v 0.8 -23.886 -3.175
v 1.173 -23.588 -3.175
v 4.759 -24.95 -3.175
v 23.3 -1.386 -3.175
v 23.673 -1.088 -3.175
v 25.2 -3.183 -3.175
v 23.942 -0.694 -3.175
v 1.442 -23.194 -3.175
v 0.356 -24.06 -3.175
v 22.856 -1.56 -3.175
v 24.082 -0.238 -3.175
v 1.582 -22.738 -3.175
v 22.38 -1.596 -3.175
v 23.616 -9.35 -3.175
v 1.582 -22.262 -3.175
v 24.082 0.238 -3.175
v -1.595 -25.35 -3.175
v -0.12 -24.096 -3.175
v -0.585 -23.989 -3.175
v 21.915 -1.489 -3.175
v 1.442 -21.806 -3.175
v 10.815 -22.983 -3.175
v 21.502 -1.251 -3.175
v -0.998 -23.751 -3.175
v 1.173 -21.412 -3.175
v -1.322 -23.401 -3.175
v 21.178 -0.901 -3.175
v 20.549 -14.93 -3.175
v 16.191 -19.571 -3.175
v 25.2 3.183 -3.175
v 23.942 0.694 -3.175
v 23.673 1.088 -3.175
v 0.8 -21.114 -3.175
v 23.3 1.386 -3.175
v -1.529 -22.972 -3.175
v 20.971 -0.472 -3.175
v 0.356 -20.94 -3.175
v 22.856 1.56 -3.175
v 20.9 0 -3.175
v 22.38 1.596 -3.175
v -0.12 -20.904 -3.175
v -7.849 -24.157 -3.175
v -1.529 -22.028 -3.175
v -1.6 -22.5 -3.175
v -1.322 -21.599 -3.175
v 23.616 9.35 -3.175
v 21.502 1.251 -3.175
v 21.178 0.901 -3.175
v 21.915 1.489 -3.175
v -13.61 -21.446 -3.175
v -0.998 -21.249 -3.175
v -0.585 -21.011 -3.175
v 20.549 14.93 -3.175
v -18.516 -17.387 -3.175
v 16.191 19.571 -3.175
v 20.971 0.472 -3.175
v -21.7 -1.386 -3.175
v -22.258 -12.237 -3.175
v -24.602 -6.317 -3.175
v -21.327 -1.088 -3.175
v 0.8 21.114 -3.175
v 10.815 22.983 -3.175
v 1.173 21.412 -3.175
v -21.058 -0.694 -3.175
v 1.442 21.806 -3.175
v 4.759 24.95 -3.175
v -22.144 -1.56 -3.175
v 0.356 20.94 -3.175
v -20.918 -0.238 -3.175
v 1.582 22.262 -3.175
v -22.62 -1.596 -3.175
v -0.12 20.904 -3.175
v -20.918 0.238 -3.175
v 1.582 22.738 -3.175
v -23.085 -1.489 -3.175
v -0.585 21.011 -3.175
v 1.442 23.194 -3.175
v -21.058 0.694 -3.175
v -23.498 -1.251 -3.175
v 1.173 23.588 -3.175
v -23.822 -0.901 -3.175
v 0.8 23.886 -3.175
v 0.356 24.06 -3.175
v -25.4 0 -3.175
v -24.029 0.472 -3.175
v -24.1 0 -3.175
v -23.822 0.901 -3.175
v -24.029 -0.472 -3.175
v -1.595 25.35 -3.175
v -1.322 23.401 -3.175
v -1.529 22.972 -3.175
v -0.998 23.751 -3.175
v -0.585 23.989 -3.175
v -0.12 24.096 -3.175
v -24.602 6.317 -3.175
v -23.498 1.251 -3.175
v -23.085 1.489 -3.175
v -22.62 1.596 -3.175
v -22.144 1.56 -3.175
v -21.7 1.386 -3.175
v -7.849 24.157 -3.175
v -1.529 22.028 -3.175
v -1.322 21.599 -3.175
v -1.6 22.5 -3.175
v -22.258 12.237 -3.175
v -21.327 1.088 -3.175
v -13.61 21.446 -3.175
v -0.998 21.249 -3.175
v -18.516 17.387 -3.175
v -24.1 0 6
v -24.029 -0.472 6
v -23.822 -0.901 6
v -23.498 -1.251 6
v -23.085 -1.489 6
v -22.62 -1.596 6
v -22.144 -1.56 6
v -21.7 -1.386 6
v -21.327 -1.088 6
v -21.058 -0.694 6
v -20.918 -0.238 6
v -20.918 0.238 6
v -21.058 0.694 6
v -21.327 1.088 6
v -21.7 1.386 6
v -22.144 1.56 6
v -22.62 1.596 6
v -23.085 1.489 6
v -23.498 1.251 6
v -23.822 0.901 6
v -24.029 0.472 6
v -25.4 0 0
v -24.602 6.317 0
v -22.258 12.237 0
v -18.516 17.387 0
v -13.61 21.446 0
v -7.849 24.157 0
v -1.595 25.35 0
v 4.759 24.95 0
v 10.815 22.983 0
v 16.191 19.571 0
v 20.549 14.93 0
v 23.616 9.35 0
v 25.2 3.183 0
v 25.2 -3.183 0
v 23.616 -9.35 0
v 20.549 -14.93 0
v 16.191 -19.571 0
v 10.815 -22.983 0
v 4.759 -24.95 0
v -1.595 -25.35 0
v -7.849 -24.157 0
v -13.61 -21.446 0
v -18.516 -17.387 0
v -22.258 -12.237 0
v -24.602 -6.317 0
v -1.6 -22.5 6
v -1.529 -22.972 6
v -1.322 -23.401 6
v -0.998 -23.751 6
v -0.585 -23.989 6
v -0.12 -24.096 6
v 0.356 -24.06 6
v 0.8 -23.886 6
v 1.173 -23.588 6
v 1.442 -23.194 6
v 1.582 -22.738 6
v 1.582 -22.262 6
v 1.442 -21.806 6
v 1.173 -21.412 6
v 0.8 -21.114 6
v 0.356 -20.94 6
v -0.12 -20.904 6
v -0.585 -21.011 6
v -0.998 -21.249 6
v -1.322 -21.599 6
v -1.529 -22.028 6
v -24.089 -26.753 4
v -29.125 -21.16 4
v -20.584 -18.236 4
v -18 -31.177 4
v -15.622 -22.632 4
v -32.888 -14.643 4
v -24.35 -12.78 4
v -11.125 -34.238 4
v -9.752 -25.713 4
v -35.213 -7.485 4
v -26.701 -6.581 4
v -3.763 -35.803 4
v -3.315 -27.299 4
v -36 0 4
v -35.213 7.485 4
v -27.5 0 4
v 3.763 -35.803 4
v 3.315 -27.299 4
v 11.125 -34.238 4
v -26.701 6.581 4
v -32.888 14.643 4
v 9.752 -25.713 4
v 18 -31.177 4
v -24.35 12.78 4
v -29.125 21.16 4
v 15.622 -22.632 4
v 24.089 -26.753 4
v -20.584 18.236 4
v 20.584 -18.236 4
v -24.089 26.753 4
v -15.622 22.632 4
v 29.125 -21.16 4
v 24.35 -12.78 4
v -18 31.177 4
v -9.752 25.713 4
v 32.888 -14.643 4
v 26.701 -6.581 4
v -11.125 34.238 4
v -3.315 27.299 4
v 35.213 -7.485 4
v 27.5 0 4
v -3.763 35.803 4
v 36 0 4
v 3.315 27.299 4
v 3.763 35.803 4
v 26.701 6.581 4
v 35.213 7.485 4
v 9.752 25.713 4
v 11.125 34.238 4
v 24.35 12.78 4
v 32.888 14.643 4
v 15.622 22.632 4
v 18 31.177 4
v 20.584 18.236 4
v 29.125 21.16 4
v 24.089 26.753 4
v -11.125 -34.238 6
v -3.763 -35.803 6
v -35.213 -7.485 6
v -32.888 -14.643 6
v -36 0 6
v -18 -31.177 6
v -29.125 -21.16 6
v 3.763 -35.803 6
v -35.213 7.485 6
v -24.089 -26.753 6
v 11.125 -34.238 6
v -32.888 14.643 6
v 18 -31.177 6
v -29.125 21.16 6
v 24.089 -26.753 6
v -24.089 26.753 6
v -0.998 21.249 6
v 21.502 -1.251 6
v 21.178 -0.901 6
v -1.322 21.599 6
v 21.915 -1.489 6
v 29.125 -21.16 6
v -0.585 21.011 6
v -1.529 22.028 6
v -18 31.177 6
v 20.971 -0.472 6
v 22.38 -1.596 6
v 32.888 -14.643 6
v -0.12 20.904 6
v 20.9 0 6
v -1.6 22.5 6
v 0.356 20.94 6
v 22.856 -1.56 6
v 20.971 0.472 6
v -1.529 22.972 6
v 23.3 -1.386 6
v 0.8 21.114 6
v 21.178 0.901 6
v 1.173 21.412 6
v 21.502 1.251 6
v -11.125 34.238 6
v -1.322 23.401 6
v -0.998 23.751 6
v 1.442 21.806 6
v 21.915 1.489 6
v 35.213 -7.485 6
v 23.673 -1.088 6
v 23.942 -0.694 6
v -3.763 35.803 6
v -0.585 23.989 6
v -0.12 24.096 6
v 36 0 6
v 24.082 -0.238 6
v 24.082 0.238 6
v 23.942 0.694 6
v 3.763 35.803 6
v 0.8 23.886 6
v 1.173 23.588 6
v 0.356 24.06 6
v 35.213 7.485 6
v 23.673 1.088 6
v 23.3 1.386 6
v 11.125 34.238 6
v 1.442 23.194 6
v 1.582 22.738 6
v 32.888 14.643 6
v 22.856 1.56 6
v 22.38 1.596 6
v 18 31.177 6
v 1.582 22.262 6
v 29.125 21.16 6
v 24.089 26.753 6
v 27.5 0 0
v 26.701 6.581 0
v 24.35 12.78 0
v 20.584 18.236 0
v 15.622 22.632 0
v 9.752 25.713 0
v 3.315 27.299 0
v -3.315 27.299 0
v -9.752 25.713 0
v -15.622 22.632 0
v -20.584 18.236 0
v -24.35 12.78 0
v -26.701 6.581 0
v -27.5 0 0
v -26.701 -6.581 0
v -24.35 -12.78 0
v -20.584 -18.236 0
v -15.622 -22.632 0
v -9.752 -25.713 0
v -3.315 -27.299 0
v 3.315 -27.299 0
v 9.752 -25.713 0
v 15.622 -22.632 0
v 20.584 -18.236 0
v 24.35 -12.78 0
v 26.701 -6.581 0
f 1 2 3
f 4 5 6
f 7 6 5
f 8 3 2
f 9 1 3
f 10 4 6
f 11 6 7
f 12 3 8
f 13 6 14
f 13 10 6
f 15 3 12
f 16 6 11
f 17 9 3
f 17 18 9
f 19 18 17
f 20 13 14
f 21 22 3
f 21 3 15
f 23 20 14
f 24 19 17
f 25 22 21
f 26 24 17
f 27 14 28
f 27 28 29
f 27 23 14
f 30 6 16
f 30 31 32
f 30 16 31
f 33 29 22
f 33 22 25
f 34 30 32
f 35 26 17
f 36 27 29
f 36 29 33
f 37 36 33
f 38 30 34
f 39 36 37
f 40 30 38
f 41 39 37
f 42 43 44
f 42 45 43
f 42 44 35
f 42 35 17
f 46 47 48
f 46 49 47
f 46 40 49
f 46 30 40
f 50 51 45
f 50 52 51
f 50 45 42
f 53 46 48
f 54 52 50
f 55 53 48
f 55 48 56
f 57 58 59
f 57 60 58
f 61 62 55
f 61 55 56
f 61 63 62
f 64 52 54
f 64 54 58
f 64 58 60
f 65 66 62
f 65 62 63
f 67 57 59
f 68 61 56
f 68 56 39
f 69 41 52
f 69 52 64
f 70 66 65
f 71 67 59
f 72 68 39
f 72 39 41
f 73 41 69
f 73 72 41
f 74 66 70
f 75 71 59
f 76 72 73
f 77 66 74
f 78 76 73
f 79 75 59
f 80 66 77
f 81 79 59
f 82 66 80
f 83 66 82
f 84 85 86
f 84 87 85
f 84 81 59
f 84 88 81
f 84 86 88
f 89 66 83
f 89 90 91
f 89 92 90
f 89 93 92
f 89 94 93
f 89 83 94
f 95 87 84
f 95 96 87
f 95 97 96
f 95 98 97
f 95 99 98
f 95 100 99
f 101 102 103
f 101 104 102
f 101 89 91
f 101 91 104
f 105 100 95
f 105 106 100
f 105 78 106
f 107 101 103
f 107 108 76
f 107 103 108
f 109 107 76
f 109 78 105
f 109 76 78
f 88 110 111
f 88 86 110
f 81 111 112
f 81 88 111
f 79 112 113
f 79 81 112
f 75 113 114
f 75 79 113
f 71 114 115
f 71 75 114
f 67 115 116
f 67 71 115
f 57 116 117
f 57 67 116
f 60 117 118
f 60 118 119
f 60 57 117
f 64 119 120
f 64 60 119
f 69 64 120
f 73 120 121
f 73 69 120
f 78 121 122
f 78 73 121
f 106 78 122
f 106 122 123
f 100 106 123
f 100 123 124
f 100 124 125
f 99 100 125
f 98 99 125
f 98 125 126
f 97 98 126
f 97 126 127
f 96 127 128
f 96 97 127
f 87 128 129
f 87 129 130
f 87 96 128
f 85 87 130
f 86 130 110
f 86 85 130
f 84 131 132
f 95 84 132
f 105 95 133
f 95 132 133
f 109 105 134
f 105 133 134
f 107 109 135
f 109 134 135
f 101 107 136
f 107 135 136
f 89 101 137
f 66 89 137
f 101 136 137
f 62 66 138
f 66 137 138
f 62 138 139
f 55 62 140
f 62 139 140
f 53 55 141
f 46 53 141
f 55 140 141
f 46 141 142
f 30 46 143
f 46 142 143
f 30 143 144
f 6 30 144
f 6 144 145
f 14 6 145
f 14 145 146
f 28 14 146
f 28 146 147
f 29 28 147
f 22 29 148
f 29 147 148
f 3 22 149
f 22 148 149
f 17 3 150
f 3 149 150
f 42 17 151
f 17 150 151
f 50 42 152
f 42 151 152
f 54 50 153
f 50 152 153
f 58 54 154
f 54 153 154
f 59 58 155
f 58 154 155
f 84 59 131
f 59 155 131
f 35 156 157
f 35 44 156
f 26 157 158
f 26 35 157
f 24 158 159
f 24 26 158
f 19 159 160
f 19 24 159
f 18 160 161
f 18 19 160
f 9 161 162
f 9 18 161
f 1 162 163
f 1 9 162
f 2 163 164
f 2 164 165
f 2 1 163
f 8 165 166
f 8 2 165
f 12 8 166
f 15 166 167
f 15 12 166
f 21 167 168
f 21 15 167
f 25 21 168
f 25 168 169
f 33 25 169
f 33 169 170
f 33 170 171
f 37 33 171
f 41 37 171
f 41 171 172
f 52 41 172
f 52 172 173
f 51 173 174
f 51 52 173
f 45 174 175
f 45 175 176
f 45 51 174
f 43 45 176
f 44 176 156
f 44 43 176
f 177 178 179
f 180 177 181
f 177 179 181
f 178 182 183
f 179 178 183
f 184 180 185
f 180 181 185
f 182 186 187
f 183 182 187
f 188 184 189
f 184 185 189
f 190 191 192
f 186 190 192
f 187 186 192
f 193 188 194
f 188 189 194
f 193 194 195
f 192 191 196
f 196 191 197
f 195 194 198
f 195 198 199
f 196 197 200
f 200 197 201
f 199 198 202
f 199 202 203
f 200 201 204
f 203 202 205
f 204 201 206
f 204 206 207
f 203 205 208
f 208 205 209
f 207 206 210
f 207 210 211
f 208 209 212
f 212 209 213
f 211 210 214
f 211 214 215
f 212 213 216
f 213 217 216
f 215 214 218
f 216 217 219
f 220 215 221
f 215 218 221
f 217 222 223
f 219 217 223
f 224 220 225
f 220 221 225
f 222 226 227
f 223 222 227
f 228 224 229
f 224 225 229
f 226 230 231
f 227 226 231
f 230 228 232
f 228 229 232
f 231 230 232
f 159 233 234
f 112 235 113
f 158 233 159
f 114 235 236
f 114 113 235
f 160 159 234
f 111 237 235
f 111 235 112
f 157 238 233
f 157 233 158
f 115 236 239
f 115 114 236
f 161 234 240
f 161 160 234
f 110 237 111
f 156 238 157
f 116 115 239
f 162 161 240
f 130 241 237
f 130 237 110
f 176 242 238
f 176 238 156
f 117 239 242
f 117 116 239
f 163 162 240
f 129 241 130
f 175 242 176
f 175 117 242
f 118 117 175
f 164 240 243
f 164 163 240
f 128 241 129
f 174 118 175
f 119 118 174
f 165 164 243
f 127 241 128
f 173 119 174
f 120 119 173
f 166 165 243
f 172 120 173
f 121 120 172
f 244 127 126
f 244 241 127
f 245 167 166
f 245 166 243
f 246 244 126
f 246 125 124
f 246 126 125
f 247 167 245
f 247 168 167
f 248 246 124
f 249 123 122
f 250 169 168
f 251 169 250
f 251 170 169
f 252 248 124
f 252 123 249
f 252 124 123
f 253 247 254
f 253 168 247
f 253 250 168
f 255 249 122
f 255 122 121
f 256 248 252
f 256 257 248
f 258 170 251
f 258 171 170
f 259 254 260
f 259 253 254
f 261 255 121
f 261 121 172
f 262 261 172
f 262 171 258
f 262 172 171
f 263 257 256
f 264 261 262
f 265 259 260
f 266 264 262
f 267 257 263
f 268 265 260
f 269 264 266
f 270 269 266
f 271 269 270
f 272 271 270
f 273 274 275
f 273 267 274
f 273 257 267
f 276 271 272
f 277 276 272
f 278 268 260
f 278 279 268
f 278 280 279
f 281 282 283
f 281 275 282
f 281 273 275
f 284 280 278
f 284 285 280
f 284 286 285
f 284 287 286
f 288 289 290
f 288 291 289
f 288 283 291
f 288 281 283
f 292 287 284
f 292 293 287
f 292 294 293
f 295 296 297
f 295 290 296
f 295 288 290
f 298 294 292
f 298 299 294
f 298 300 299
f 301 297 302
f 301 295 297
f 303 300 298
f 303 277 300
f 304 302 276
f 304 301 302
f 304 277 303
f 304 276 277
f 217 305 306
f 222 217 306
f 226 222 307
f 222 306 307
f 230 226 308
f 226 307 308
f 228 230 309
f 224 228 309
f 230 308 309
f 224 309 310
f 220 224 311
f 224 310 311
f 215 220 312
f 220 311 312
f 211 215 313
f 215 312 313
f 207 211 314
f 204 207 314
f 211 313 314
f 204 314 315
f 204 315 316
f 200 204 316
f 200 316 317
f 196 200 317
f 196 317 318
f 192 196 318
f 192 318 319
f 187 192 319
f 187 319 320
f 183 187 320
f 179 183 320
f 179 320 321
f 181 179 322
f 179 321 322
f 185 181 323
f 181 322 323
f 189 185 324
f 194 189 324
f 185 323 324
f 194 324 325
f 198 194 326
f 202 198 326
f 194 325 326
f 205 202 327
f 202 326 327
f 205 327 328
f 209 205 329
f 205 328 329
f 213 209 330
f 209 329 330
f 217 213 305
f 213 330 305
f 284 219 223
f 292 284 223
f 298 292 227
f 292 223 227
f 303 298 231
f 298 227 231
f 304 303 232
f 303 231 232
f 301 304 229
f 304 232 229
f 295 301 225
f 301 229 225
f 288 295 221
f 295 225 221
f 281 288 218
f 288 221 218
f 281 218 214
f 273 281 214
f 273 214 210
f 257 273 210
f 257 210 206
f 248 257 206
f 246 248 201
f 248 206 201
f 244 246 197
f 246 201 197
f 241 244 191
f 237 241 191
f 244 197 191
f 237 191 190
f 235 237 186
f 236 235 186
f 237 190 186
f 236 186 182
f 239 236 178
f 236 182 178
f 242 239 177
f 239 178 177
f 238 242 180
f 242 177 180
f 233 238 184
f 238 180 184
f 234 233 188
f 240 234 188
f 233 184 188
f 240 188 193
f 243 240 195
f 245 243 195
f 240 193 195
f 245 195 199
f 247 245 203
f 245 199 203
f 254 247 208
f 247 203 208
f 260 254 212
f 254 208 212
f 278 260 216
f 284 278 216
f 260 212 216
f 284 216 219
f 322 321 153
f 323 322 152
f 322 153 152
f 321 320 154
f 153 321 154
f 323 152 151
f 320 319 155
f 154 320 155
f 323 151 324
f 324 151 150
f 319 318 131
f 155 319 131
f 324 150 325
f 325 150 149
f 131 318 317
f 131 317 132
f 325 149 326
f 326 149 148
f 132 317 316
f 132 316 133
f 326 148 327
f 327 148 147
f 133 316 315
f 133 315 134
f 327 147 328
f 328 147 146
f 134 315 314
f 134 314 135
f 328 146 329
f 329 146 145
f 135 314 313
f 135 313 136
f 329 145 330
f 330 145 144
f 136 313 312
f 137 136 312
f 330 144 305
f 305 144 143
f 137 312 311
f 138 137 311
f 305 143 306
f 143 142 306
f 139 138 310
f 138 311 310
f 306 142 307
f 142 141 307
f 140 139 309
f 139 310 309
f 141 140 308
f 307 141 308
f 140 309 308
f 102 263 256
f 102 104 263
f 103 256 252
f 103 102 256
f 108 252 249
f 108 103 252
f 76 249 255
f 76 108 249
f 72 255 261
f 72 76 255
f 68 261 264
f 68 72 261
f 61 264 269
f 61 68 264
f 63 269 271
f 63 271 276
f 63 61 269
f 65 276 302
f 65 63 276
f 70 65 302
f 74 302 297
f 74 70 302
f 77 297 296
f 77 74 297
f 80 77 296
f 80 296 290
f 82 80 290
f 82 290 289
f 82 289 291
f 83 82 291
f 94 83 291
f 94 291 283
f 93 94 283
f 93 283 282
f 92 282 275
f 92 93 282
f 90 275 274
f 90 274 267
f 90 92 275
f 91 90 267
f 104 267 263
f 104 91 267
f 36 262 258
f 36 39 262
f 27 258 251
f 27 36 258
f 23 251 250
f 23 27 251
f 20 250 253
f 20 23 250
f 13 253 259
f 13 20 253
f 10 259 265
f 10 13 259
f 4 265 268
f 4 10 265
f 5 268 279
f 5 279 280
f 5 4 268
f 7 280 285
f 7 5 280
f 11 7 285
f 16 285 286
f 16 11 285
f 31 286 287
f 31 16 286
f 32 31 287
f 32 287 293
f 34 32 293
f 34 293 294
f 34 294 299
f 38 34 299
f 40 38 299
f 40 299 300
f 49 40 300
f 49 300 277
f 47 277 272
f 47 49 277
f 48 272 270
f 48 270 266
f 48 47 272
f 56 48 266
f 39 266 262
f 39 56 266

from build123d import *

# Parameters (mm, degrees)
SKETCH_1_R          = 27.5
EXTRUDE_1_DEPTH     = 4
SKETCH_2_R          = 25.4
EXTRUDE_2_DEPTH     = 3.175
SKETCH_3_R          = 1.6
CUT_EXTRUDE_1_DEPTH = 40.547194907
SKETCH_4_R          = 36
SKETCH_4_R_2        = 1.6
EXTRUDE_3_DEPTH     = 2


with BuildPart() as part:
    # ｽｹｯﾁ1 → ﾎﾞｽ - 押し出し1 (new body)
    with BuildSketch(Plane.XY):
        Circle(SKETCH_1_R)
    extrude(amount=EXTRUDE_1_DEPTH)

    # ｽｹｯﾁ2 → ﾎﾞｽ - 押し出し2 (add)
    with BuildSketch(Plane(origin=(0, 0, 0), x_dir=(-1, 0, 0), z_dir=(0, 0, -1))):
        Circle(SKETCH_2_R)
    extrude(amount=EXTRUDE_2_DEPTH)

    # ｽｹｯﾁ3 → ｶｯﾄ - 押し出し1 (cut, through all)
    with BuildSketch(Plane(origin=(0, 0, -3.175), x_dir=(-1, 0, 0), z_dir=(0, 0, -1))):
        with Locations((0, 22.5)):
            Circle(SKETCH_3_R)
        with Locations((22.5, 0)):
            Circle(SKETCH_3_R)
        with Locations((0, -22.5)):
            Circle(SKETCH_3_R)
        with Locations((-22.5, 0)):
            Circle(SKETCH_3_R)
    extrude(amount=-CUT_EXTRUDE_1_DEPTH, mode=Mode.SUBTRACT)

    # ｽｹｯﾁ4 → ﾎﾞｽ - 押し出し3 (add)
    with BuildSketch(Plane.XY.offset(4)):
        Circle(SKETCH_4_R)
        with Locations(Location((0, 22.5, 0), (0, 0, 180))):
            Circle(SKETCH_4_R_2, mode=Mode.SUBTRACT)
        with Locations(Location((-22.5, 0, 0), (0, 0, 180))):
            Circle(SKETCH_4_R_2, mode=Mode.SUBTRACT)
        with Locations(Location((0, -22.5, 0), (0, 0, 180))):
            Circle(SKETCH_4_R_2, mode=Mode.SUBTRACT)
        with Locations(Location((22.5, 0, 0), (0, 0, 180))):
            Circle(SKETCH_4_R_2, mode=Mode.SUBTRACT)
    extrude(amount=EXTRUDE_3_DEPTH)


solid = part.part
